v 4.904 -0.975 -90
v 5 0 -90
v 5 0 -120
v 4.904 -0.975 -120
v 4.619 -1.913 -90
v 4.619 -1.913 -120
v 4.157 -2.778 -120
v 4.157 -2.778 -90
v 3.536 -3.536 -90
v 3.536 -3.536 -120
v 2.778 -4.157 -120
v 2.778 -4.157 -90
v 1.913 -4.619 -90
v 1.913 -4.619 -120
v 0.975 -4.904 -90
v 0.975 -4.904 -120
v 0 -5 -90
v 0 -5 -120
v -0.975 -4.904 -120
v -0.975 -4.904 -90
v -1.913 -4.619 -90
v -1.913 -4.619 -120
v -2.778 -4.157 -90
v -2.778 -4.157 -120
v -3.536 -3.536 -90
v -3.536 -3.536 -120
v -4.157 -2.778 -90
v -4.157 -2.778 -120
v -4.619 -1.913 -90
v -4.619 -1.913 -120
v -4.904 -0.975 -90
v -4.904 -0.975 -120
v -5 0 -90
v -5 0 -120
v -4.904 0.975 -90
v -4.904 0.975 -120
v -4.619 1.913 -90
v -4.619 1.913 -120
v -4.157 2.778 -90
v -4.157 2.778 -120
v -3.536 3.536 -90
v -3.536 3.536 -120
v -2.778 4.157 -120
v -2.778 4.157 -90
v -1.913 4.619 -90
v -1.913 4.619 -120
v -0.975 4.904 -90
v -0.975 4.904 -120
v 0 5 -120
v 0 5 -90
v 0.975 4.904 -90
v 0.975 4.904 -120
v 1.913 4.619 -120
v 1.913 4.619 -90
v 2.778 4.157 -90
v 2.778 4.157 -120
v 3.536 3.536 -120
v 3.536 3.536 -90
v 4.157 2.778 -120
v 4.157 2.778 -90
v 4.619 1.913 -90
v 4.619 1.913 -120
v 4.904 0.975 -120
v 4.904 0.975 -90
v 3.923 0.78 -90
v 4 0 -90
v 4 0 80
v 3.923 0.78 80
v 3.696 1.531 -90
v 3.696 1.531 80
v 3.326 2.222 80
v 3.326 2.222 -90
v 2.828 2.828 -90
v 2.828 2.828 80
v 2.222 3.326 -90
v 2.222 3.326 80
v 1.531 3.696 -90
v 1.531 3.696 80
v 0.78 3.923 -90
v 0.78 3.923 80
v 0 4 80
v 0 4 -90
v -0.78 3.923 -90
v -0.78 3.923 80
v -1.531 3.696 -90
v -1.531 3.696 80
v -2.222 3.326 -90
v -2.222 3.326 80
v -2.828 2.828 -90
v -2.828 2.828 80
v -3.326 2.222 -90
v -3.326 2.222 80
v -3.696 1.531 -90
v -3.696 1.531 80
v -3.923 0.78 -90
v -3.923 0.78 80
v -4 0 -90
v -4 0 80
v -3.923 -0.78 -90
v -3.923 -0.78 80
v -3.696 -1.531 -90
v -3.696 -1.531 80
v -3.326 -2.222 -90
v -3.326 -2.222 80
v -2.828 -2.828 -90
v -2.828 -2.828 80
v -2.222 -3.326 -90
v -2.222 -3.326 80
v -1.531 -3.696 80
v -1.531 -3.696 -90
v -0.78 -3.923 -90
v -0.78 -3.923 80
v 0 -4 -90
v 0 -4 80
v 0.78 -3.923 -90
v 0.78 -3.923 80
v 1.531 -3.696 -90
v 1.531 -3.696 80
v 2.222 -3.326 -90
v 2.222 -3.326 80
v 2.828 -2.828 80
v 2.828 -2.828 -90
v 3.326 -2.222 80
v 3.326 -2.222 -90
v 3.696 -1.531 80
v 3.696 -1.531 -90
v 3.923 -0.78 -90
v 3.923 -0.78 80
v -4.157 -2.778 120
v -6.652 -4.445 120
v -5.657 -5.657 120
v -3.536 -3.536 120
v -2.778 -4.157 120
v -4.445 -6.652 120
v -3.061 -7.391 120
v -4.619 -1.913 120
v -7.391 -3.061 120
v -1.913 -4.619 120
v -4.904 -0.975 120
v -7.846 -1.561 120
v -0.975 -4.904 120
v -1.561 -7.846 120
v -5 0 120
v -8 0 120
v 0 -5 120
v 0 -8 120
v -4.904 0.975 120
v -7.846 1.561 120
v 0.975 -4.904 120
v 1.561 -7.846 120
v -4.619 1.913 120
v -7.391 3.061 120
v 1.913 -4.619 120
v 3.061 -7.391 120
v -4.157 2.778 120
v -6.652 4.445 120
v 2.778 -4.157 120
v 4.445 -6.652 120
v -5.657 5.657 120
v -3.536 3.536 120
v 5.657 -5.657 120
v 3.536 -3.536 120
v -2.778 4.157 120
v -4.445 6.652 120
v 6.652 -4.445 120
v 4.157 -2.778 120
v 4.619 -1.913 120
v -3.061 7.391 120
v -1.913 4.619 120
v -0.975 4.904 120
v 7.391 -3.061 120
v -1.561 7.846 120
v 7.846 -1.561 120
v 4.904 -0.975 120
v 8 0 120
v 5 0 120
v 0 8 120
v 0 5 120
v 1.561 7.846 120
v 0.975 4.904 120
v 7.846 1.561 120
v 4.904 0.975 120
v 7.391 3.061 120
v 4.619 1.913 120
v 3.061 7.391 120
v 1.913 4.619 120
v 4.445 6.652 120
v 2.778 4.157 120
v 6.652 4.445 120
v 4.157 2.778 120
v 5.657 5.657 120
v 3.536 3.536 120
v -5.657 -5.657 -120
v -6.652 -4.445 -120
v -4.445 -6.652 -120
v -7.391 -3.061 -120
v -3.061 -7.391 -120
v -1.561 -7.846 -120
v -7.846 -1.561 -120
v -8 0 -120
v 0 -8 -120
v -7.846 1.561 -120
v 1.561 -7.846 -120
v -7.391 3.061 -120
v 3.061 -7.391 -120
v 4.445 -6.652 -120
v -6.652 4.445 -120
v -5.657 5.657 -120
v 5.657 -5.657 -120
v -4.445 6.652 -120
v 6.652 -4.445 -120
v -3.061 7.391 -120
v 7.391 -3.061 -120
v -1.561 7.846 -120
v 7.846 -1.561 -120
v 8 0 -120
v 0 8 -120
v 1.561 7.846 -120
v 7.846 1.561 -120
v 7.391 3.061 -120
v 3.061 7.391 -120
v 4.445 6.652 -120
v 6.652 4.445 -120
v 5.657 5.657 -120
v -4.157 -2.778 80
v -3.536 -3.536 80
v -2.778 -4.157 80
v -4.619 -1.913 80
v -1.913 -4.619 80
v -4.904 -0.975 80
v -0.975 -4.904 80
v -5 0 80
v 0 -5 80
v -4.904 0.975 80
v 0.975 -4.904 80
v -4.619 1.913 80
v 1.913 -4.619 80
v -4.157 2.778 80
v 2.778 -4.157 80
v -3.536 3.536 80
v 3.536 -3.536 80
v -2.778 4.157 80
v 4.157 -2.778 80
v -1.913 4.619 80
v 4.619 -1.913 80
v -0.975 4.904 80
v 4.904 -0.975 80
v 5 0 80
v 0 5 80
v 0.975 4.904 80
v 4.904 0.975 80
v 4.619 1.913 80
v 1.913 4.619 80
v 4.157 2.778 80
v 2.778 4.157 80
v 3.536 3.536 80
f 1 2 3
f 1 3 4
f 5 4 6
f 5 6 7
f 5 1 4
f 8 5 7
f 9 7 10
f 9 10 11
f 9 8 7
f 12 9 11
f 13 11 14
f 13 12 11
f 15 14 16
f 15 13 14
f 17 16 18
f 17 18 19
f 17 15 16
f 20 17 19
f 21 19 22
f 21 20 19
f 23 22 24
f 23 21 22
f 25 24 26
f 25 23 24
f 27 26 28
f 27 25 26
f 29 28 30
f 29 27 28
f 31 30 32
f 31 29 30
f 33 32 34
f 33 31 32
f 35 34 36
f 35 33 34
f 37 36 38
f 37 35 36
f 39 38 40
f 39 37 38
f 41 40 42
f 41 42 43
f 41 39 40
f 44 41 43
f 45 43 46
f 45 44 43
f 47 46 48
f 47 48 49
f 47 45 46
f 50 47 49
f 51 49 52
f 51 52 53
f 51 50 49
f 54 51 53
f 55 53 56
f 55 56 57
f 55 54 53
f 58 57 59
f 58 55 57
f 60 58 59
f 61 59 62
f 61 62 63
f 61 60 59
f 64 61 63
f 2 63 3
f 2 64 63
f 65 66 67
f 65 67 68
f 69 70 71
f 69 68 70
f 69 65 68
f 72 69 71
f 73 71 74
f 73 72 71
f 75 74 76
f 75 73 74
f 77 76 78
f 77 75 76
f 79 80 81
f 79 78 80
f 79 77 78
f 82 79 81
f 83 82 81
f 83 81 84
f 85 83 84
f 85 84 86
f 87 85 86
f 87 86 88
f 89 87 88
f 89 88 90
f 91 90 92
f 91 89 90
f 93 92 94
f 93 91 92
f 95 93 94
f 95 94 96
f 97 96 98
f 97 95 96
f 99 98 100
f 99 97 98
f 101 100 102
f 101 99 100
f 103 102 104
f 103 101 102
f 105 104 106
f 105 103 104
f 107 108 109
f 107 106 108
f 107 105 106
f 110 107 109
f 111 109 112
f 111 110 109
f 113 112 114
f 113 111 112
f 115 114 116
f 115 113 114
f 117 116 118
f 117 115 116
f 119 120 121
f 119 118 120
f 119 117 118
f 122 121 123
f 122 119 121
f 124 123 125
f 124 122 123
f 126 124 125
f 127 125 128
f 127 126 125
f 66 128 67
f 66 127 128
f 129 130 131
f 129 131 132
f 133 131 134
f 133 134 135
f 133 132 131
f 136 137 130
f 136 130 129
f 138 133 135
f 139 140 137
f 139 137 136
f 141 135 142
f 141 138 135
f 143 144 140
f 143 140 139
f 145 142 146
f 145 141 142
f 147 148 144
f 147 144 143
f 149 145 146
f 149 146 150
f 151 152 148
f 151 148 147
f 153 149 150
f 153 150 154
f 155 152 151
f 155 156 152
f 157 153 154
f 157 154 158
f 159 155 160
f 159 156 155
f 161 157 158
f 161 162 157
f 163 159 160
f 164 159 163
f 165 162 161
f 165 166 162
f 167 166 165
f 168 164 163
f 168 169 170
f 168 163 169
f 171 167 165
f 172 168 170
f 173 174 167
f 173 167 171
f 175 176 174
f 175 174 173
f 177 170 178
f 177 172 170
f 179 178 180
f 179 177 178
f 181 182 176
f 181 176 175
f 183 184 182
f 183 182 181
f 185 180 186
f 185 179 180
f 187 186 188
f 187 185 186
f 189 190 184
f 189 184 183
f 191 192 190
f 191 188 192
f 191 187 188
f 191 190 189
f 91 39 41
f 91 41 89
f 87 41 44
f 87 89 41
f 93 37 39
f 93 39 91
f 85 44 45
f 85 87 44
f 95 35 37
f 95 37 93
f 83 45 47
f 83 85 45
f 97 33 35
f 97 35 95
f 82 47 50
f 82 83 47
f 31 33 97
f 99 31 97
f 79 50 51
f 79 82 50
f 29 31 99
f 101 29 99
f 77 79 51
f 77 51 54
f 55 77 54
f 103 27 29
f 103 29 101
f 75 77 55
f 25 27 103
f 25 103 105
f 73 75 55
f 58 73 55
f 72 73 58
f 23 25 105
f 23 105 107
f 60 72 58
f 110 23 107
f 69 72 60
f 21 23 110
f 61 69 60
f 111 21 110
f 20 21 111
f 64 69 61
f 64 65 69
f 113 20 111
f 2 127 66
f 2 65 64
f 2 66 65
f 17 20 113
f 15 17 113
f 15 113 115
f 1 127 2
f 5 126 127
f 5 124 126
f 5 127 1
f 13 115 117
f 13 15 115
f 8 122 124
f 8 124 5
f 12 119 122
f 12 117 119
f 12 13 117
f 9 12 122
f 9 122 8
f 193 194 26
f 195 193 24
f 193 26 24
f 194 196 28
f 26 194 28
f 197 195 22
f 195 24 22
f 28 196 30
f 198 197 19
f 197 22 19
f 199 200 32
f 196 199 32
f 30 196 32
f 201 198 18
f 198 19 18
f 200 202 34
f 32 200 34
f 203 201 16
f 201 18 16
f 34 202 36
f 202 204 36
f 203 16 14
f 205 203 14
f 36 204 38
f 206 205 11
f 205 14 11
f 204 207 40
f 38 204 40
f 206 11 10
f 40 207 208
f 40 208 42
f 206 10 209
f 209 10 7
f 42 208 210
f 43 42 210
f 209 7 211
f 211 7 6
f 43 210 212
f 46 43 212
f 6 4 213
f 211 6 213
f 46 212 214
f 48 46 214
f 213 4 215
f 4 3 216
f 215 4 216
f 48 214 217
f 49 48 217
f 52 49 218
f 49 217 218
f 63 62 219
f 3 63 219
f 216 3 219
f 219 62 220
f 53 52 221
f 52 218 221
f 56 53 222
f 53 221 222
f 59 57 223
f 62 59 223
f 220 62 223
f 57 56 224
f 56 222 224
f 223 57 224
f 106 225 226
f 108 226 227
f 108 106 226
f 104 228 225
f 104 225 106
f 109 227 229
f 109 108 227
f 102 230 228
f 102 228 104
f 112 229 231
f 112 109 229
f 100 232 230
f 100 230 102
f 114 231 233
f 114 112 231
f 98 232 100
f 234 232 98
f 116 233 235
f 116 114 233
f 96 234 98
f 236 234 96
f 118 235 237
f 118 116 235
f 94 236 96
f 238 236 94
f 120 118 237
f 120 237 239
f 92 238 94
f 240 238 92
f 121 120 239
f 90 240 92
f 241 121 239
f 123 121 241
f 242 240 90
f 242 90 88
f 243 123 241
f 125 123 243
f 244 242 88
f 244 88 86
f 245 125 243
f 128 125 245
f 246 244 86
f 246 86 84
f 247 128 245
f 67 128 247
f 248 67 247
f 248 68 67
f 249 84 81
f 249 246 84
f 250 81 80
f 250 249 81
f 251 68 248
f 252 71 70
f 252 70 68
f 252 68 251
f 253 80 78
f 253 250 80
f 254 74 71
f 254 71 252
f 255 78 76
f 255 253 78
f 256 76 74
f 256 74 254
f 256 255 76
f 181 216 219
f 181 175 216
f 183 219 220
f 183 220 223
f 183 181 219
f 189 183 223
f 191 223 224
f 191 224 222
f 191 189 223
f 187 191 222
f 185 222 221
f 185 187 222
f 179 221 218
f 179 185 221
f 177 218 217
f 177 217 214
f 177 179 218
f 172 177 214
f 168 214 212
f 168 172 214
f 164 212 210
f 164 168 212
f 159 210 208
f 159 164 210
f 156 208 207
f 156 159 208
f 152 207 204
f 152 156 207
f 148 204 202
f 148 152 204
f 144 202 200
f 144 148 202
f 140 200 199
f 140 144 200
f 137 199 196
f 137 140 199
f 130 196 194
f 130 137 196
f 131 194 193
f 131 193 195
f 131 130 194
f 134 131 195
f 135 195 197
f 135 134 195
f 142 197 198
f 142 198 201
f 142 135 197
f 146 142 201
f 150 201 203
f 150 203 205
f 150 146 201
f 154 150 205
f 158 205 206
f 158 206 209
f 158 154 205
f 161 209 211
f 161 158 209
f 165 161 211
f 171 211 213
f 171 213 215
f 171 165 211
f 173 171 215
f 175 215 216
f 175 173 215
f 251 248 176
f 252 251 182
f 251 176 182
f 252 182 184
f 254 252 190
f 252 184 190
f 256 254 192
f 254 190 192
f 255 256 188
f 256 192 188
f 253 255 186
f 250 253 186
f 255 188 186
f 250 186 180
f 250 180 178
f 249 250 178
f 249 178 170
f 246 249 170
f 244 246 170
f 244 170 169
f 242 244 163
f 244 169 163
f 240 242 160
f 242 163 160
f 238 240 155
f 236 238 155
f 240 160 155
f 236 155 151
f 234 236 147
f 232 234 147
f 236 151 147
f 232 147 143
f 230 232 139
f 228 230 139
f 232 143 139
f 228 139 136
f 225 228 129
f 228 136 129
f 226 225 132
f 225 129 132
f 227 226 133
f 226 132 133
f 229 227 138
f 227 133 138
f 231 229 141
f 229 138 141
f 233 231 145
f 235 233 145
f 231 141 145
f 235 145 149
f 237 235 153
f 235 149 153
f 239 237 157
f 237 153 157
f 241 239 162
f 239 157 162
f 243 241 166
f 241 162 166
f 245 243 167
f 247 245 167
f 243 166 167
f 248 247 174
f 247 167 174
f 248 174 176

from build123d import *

# Parameters (mm, degrees)
SZKIC1_R                    = 8
SZKIC1_R_2                  = 4
DODANIE_WYCI_GNI_CIE1_DEPTH = 120
SZKIC2_R                    = 5
WYTNIJ_WYCI_GNI_CIE1_DEPTH  = 40
WYTNIJ_WYCI_GNI_CIE2_START  = -30
SZKIC3_R                    = 5
WYTNIJ_WYCI_GNI_CIE2_DEPTH  = 30


with BuildPart() as part:
    # Szkic1 → Dodanie-wyciągnięcie1 (new, symmetric)
    with BuildSketch(Plane.XY):
        Circle(SZKIC1_R)
        Circle(SZKIC1_R_2, mode=Mode.SUBTRACT)
    extrude(amount=DODANIE_WYCI_GNI_CIE1_DEPTH, both=True)

    # Szkic2 → Wytnij-wyciągnięcie1 (cut)
    with BuildSketch(Plane.XY.offset(120)):
        Circle(SZKIC2_R)
    extrude(amount=-WYTNIJ_WYCI_GNI_CIE1_DEPTH, mode=Mode.SUBTRACT)

    # Szkic3 → Wytnij-wyciągnięcie2 (cut)
    with BuildSketch(Plane(origin=(0, 0, -120), x_dir=(-1, 0, 0), z_dir=(0, 0, -1)).offset(WYTNIJ_WYCI_GNI_CIE2_START)):
        with Locations(Location((0, 0, 0), (0, 0, 180))):
            Circle(SZKIC3_R)
    extrude(amount=WYTNIJ_WYCI_GNI_CIE2_DEPTH, mode=Mode.SUBTRACT)


solid = part.part
